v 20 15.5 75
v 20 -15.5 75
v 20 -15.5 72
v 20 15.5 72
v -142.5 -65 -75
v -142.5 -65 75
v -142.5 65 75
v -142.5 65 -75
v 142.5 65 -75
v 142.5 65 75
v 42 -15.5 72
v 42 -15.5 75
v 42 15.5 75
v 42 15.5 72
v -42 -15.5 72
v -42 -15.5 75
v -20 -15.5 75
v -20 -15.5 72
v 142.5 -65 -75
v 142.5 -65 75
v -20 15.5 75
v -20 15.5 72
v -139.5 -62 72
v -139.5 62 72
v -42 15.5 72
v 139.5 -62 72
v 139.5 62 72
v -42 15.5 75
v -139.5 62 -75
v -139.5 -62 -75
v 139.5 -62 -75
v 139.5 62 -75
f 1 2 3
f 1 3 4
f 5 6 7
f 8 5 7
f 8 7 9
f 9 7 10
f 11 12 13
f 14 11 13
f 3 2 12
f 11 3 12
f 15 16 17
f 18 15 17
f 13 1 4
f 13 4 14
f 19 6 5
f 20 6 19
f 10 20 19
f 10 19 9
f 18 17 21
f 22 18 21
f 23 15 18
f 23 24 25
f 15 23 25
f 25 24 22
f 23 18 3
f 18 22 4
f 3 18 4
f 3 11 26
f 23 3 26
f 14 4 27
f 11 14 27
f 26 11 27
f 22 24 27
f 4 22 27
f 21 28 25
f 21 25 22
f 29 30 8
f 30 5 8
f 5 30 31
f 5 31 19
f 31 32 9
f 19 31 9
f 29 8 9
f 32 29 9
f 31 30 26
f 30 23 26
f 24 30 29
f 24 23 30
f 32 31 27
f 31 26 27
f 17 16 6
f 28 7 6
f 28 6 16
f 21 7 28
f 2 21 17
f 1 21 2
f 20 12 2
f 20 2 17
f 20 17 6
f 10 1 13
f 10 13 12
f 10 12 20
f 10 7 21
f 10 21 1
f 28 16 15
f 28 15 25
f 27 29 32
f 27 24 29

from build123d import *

# Parameters (mm, degrees)
SKETCH_W     = 285
SKETCH_H     = 130
PAD_DEPTH    = 75
THICKNESS_T  = -3
SKETCH001_W  = 22
SKETCH001_H  = 31
POCKET_DEPTH = 5


with BuildPart() as part:
    # Sketch → Pad (new body, symmetric)
    with BuildSketch(Plane.XY):
        Rectangle(SKETCH_W, SKETCH_H)
    extrude(amount=PAD_DEPTH, both=True)

    # Thickness
    thickness_openings = [part.faces().sort_by_distance(p)[0] for p in [
        (0, 0, -75),
    ]]
    offset(amount=THICKNESS_T, openings=thickness_openings)

    # Sketch001 (on Face5 of Thickness) → Pocket (cut)
    with BuildSketch(Plane.XY.offset(75)):
        with Locations((31, 0)):
            Rectangle(SKETCH001_W, SKETCH001_H)
        with Locations((-31, 0)):
            Rectangle(SKETCH001_W, SKETCH001_H)
    extrude(amount=-POCKET_DEPTH, mode=Mode.SUBTRACT)


solid = part.part
